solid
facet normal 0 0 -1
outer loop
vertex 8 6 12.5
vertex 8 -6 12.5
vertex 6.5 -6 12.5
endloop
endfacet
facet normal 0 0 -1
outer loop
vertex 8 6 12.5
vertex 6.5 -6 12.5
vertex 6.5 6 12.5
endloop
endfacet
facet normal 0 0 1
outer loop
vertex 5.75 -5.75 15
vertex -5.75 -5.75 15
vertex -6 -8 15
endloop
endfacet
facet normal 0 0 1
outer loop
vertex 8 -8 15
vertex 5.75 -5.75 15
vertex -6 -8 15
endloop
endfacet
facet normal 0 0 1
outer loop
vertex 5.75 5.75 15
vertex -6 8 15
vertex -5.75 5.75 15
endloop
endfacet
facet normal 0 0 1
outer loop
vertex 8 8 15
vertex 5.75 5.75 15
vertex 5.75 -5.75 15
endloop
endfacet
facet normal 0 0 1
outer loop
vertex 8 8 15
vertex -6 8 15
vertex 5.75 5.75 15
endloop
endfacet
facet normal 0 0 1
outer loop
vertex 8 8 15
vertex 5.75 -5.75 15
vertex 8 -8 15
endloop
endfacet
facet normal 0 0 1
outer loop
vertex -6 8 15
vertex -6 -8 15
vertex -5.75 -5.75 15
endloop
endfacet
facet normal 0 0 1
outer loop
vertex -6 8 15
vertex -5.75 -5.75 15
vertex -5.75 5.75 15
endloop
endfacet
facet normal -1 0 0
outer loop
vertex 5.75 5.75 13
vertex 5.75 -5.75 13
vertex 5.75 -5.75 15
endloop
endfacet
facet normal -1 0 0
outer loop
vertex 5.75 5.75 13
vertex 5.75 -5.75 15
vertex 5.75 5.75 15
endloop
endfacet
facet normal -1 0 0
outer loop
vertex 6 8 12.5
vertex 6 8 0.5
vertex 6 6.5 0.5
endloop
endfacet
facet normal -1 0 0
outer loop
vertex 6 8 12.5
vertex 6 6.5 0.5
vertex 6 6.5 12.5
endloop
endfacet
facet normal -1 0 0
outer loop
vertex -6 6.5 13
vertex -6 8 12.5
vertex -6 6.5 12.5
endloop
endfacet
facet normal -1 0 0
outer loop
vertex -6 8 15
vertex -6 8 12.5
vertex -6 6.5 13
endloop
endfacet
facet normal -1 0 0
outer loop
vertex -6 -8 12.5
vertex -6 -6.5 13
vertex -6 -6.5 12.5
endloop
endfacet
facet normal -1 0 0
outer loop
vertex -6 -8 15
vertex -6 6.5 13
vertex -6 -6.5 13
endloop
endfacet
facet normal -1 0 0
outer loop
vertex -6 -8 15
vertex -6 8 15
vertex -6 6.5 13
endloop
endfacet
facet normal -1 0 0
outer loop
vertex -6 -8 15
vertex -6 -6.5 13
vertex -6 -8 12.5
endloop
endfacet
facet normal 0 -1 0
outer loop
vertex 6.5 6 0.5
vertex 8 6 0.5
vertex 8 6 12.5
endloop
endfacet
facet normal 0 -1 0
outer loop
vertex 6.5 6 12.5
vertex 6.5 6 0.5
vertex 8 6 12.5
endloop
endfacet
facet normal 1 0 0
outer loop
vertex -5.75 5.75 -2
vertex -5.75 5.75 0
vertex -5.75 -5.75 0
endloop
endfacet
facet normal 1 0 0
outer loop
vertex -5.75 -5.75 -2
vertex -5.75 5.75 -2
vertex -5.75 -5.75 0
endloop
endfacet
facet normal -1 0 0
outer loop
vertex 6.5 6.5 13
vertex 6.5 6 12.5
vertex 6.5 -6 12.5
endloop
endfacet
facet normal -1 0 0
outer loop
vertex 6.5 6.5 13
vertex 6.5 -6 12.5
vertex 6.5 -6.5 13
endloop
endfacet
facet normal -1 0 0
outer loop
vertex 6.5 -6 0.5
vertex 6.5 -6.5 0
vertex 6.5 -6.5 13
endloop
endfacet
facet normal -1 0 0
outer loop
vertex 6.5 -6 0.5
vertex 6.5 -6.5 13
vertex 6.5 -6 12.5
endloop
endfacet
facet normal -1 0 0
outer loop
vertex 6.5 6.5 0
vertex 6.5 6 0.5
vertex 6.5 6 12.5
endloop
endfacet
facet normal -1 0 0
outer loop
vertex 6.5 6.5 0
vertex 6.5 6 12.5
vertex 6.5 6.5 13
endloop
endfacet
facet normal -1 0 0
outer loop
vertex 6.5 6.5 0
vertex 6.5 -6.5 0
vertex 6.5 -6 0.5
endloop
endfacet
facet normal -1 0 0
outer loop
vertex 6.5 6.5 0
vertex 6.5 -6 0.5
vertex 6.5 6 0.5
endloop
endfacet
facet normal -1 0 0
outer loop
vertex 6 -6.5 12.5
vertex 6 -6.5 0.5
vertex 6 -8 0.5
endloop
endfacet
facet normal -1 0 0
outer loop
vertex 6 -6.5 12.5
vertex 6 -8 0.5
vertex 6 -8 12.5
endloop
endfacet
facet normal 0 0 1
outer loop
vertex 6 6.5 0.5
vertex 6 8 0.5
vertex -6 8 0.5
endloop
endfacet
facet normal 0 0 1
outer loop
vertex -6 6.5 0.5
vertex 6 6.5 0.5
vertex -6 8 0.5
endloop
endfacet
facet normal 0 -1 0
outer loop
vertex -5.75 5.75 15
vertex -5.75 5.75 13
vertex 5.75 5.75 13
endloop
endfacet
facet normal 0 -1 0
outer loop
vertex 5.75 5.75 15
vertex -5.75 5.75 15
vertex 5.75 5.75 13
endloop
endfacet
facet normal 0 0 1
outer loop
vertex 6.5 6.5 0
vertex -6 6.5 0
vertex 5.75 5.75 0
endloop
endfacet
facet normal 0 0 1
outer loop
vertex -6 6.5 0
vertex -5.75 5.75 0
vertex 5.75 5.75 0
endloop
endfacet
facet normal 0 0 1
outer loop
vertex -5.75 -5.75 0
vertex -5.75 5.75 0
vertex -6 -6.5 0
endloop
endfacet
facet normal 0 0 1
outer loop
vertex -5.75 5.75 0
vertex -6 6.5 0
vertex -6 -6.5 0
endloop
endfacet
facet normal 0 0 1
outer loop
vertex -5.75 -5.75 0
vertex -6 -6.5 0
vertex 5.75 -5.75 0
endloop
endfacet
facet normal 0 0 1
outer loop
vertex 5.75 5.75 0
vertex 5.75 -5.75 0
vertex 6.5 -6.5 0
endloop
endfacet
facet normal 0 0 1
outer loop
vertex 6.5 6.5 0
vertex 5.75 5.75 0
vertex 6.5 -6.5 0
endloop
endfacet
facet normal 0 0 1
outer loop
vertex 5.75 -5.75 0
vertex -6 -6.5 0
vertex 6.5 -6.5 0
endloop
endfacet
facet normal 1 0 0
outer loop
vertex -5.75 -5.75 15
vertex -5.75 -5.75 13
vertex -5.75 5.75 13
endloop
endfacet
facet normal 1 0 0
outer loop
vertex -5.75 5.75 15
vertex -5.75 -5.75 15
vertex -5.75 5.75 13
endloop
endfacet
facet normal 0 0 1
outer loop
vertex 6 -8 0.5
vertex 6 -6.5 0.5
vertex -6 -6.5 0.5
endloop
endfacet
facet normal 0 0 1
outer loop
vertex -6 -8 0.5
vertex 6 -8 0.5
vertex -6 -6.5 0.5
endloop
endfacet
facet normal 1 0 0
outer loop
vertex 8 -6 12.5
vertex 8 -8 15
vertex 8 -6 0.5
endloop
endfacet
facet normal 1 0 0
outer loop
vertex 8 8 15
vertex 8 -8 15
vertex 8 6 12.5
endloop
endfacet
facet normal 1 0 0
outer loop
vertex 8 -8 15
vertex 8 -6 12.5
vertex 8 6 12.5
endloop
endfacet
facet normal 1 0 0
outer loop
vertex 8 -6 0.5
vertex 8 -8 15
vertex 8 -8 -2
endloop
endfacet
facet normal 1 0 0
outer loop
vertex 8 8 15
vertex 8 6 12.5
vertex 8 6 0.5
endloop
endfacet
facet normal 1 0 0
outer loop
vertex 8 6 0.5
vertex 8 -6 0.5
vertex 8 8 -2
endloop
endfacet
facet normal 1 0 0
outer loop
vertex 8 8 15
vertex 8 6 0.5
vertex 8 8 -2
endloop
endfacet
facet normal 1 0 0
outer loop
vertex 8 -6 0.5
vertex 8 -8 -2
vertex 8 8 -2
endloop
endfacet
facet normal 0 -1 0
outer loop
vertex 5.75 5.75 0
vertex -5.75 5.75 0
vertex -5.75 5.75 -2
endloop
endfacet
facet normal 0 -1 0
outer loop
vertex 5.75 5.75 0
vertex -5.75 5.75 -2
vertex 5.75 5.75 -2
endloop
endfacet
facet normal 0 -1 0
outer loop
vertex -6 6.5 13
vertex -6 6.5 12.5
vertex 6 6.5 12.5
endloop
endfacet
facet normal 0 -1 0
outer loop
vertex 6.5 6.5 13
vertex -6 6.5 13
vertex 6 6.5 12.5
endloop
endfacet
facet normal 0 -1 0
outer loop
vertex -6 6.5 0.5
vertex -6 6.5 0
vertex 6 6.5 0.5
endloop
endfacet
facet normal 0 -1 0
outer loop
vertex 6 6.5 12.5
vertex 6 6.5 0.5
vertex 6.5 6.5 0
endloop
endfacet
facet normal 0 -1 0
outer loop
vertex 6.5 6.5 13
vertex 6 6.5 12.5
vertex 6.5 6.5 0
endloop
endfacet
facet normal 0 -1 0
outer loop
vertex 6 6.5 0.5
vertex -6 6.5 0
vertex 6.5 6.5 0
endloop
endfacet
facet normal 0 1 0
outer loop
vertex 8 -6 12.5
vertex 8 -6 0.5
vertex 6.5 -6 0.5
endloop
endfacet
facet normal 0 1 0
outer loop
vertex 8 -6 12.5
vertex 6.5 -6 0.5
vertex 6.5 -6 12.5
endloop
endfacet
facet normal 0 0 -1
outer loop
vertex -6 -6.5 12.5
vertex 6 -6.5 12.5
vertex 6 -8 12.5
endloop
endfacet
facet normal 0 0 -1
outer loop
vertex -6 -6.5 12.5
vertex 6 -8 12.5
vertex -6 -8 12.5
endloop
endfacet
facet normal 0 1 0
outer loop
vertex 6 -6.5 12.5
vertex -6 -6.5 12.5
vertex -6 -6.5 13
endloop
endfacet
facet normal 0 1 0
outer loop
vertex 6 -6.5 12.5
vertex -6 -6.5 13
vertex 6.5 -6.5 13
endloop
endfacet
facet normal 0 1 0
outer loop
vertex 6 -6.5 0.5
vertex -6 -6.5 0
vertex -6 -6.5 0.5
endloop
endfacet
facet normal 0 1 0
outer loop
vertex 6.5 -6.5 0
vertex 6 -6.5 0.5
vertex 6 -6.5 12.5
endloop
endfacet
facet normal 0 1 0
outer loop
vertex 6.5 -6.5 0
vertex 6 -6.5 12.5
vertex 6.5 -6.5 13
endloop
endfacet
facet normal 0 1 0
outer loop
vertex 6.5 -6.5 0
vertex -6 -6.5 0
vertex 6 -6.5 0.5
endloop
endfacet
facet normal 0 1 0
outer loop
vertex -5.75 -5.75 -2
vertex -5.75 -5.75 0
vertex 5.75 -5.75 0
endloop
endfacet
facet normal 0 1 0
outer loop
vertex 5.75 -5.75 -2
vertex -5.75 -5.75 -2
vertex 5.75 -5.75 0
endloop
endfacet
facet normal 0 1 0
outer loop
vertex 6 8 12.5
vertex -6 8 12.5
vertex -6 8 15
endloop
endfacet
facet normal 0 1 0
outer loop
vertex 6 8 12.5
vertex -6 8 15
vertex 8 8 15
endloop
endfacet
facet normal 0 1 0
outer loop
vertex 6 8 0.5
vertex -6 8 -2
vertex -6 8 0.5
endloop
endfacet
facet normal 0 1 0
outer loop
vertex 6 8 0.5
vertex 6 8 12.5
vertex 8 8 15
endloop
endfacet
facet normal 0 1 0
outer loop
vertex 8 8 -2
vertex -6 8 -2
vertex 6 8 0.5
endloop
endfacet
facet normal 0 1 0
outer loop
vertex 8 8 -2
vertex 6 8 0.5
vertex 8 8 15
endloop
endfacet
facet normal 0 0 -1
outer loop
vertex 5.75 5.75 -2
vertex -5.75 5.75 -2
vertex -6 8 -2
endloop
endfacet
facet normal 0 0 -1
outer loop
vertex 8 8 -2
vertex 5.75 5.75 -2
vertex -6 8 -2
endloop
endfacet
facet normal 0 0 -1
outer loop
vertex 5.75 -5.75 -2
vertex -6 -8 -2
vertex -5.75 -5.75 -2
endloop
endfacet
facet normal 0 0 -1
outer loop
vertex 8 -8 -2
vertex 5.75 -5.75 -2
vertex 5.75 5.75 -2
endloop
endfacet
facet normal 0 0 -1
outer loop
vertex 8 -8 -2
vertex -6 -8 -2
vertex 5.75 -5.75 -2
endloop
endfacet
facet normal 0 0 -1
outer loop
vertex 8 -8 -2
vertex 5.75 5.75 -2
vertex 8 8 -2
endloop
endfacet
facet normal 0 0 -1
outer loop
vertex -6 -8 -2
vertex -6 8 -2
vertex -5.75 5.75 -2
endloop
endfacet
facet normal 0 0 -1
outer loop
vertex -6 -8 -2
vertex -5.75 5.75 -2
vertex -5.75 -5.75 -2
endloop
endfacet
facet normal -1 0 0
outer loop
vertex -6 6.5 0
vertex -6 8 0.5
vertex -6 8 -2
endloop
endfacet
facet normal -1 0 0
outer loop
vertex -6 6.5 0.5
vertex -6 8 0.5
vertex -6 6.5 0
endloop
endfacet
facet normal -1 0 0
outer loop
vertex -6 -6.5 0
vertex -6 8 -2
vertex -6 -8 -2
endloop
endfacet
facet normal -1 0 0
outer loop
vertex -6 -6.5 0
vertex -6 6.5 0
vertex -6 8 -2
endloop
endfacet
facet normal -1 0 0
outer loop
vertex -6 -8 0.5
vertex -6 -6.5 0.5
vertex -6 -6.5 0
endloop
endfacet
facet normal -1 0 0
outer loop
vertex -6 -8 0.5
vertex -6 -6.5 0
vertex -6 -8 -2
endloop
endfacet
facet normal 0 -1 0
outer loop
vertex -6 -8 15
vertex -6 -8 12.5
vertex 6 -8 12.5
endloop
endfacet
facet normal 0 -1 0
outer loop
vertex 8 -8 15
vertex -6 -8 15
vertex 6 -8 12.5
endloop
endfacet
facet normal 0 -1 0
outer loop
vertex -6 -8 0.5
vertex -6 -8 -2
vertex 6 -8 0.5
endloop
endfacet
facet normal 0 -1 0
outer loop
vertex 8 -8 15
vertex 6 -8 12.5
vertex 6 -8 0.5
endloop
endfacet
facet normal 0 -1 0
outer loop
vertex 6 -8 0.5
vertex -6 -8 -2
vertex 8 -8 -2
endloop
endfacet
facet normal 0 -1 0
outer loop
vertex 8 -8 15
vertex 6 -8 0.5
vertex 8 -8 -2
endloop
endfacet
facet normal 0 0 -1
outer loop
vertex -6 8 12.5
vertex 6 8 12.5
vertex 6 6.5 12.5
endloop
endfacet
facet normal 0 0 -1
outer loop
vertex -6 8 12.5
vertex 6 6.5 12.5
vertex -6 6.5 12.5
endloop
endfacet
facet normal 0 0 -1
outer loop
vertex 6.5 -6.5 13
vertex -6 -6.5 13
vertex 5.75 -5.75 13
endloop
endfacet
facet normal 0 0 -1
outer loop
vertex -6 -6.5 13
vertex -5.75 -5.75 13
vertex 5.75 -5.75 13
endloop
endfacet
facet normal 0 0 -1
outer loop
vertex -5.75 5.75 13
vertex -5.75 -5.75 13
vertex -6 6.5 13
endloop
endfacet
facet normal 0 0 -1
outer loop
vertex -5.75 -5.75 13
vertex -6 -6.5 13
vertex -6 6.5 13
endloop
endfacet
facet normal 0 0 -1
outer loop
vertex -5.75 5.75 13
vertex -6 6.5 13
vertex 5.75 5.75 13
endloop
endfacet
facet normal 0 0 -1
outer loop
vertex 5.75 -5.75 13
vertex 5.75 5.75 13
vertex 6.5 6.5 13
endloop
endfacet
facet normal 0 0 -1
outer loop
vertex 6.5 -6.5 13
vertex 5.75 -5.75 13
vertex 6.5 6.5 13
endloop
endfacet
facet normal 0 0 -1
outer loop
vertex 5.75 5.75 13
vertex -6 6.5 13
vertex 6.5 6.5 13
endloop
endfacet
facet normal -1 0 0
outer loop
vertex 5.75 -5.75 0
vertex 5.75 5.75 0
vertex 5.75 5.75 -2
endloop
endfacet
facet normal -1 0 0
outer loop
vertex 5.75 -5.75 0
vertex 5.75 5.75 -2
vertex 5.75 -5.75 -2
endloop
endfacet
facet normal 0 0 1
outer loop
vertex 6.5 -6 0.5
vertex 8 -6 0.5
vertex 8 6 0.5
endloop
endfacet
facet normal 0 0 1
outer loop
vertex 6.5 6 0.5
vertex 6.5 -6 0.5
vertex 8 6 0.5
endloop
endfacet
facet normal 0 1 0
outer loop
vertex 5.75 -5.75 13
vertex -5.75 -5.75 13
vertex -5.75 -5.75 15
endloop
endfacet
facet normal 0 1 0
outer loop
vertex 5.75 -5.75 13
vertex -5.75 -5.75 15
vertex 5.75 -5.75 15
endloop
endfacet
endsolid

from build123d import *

# Parameters (mm, degrees)
F0_W      = 16
F0_H      = 16
F0_W_2    = 13
F0_H_2    = 13
F1_DEPTH  = 13
F2_W      = 16
F2_H      = 16
F2_W_2    = 11.5
F2_H_2    = 11.5
F3_DEPTH  = 2
F4_W      = 16
F4_H      = 16
F4_W_2    = 11.5
F4_H_2    = 11.5
F5_DEPTH  = 2
F6_W      = 12
F6_H      = 12
F7_DEPTH  = 16.001
F8_W      = 12
F8_H      = 12
F9_DEPTH  = 1.5
F10_W     = 16
F10_H     = 17
F11_DEPTH = 2


with BuildPart() as f1:
    # F0 (on Top) → F1 (new body)
    with BuildSketch(Plane.XY):
        Rectangle(F0_W, F0_H)
        Rectangle(F0_W_2, F0_H_2, mode=Mode.SUBTRACT)
    extrude(amount=F1_DEPTH)

    # F2 (on face) → F3 (join)
    with BuildSketch(Plane(origin=(0, 0, 0), x_dir=(1, 0, 0), z_dir=(0, 0, -1))):
        Rectangle(F2_W, F2_H)
        Rectangle(F2_W_2, F2_H_2, mode=Mode.SUBTRACT)
    extrude(amount=F3_DEPTH)

    # F4 (on face) → F5 (join)
    with BuildSketch(Plane.XY.offset(13)):
        Rectangle(F4_W, F4_H)
        Rectangle(F4_W_2, F4_H_2, mode=Mode.SUBTRACT)
    extrude(amount=F5_DEPTH)

    # F6 (on face) → F7 (cut, through all)
    with BuildSketch(Plane(origin=(0, 8, 0), x_dir=(-1, 0, 0), z_dir=(0, 1, 0))):
        with Locations((0, 6.5)):
            Rectangle(F6_W, F6_H)
    extrude(amount=-F7_DEPTH, mode=Mode.SUBTRACT)

    # F8 (on face) → F9 (cut, through all)
    with BuildSketch(Plane.YZ.offset(8)):
        with Locations((0, 6.5)):
            Rectangle(F8_W, F8_H)
    extrude(amount=-F9_DEPTH, mode=Mode.SUBTRACT)

    # F10 (on face) → F11 (cut)
    with BuildSketch(Plane(origin=(-8, 0, 0), x_dir=(0, -1, 0), z_dir=(-1, 0, 0))):
        with Locations((0, 6.5)):
            Rectangle(F10_W, F10_H)
    extrude(amount=-F11_DEPTH, mode=Mode.SUBTRACT)


solid = f1.part
